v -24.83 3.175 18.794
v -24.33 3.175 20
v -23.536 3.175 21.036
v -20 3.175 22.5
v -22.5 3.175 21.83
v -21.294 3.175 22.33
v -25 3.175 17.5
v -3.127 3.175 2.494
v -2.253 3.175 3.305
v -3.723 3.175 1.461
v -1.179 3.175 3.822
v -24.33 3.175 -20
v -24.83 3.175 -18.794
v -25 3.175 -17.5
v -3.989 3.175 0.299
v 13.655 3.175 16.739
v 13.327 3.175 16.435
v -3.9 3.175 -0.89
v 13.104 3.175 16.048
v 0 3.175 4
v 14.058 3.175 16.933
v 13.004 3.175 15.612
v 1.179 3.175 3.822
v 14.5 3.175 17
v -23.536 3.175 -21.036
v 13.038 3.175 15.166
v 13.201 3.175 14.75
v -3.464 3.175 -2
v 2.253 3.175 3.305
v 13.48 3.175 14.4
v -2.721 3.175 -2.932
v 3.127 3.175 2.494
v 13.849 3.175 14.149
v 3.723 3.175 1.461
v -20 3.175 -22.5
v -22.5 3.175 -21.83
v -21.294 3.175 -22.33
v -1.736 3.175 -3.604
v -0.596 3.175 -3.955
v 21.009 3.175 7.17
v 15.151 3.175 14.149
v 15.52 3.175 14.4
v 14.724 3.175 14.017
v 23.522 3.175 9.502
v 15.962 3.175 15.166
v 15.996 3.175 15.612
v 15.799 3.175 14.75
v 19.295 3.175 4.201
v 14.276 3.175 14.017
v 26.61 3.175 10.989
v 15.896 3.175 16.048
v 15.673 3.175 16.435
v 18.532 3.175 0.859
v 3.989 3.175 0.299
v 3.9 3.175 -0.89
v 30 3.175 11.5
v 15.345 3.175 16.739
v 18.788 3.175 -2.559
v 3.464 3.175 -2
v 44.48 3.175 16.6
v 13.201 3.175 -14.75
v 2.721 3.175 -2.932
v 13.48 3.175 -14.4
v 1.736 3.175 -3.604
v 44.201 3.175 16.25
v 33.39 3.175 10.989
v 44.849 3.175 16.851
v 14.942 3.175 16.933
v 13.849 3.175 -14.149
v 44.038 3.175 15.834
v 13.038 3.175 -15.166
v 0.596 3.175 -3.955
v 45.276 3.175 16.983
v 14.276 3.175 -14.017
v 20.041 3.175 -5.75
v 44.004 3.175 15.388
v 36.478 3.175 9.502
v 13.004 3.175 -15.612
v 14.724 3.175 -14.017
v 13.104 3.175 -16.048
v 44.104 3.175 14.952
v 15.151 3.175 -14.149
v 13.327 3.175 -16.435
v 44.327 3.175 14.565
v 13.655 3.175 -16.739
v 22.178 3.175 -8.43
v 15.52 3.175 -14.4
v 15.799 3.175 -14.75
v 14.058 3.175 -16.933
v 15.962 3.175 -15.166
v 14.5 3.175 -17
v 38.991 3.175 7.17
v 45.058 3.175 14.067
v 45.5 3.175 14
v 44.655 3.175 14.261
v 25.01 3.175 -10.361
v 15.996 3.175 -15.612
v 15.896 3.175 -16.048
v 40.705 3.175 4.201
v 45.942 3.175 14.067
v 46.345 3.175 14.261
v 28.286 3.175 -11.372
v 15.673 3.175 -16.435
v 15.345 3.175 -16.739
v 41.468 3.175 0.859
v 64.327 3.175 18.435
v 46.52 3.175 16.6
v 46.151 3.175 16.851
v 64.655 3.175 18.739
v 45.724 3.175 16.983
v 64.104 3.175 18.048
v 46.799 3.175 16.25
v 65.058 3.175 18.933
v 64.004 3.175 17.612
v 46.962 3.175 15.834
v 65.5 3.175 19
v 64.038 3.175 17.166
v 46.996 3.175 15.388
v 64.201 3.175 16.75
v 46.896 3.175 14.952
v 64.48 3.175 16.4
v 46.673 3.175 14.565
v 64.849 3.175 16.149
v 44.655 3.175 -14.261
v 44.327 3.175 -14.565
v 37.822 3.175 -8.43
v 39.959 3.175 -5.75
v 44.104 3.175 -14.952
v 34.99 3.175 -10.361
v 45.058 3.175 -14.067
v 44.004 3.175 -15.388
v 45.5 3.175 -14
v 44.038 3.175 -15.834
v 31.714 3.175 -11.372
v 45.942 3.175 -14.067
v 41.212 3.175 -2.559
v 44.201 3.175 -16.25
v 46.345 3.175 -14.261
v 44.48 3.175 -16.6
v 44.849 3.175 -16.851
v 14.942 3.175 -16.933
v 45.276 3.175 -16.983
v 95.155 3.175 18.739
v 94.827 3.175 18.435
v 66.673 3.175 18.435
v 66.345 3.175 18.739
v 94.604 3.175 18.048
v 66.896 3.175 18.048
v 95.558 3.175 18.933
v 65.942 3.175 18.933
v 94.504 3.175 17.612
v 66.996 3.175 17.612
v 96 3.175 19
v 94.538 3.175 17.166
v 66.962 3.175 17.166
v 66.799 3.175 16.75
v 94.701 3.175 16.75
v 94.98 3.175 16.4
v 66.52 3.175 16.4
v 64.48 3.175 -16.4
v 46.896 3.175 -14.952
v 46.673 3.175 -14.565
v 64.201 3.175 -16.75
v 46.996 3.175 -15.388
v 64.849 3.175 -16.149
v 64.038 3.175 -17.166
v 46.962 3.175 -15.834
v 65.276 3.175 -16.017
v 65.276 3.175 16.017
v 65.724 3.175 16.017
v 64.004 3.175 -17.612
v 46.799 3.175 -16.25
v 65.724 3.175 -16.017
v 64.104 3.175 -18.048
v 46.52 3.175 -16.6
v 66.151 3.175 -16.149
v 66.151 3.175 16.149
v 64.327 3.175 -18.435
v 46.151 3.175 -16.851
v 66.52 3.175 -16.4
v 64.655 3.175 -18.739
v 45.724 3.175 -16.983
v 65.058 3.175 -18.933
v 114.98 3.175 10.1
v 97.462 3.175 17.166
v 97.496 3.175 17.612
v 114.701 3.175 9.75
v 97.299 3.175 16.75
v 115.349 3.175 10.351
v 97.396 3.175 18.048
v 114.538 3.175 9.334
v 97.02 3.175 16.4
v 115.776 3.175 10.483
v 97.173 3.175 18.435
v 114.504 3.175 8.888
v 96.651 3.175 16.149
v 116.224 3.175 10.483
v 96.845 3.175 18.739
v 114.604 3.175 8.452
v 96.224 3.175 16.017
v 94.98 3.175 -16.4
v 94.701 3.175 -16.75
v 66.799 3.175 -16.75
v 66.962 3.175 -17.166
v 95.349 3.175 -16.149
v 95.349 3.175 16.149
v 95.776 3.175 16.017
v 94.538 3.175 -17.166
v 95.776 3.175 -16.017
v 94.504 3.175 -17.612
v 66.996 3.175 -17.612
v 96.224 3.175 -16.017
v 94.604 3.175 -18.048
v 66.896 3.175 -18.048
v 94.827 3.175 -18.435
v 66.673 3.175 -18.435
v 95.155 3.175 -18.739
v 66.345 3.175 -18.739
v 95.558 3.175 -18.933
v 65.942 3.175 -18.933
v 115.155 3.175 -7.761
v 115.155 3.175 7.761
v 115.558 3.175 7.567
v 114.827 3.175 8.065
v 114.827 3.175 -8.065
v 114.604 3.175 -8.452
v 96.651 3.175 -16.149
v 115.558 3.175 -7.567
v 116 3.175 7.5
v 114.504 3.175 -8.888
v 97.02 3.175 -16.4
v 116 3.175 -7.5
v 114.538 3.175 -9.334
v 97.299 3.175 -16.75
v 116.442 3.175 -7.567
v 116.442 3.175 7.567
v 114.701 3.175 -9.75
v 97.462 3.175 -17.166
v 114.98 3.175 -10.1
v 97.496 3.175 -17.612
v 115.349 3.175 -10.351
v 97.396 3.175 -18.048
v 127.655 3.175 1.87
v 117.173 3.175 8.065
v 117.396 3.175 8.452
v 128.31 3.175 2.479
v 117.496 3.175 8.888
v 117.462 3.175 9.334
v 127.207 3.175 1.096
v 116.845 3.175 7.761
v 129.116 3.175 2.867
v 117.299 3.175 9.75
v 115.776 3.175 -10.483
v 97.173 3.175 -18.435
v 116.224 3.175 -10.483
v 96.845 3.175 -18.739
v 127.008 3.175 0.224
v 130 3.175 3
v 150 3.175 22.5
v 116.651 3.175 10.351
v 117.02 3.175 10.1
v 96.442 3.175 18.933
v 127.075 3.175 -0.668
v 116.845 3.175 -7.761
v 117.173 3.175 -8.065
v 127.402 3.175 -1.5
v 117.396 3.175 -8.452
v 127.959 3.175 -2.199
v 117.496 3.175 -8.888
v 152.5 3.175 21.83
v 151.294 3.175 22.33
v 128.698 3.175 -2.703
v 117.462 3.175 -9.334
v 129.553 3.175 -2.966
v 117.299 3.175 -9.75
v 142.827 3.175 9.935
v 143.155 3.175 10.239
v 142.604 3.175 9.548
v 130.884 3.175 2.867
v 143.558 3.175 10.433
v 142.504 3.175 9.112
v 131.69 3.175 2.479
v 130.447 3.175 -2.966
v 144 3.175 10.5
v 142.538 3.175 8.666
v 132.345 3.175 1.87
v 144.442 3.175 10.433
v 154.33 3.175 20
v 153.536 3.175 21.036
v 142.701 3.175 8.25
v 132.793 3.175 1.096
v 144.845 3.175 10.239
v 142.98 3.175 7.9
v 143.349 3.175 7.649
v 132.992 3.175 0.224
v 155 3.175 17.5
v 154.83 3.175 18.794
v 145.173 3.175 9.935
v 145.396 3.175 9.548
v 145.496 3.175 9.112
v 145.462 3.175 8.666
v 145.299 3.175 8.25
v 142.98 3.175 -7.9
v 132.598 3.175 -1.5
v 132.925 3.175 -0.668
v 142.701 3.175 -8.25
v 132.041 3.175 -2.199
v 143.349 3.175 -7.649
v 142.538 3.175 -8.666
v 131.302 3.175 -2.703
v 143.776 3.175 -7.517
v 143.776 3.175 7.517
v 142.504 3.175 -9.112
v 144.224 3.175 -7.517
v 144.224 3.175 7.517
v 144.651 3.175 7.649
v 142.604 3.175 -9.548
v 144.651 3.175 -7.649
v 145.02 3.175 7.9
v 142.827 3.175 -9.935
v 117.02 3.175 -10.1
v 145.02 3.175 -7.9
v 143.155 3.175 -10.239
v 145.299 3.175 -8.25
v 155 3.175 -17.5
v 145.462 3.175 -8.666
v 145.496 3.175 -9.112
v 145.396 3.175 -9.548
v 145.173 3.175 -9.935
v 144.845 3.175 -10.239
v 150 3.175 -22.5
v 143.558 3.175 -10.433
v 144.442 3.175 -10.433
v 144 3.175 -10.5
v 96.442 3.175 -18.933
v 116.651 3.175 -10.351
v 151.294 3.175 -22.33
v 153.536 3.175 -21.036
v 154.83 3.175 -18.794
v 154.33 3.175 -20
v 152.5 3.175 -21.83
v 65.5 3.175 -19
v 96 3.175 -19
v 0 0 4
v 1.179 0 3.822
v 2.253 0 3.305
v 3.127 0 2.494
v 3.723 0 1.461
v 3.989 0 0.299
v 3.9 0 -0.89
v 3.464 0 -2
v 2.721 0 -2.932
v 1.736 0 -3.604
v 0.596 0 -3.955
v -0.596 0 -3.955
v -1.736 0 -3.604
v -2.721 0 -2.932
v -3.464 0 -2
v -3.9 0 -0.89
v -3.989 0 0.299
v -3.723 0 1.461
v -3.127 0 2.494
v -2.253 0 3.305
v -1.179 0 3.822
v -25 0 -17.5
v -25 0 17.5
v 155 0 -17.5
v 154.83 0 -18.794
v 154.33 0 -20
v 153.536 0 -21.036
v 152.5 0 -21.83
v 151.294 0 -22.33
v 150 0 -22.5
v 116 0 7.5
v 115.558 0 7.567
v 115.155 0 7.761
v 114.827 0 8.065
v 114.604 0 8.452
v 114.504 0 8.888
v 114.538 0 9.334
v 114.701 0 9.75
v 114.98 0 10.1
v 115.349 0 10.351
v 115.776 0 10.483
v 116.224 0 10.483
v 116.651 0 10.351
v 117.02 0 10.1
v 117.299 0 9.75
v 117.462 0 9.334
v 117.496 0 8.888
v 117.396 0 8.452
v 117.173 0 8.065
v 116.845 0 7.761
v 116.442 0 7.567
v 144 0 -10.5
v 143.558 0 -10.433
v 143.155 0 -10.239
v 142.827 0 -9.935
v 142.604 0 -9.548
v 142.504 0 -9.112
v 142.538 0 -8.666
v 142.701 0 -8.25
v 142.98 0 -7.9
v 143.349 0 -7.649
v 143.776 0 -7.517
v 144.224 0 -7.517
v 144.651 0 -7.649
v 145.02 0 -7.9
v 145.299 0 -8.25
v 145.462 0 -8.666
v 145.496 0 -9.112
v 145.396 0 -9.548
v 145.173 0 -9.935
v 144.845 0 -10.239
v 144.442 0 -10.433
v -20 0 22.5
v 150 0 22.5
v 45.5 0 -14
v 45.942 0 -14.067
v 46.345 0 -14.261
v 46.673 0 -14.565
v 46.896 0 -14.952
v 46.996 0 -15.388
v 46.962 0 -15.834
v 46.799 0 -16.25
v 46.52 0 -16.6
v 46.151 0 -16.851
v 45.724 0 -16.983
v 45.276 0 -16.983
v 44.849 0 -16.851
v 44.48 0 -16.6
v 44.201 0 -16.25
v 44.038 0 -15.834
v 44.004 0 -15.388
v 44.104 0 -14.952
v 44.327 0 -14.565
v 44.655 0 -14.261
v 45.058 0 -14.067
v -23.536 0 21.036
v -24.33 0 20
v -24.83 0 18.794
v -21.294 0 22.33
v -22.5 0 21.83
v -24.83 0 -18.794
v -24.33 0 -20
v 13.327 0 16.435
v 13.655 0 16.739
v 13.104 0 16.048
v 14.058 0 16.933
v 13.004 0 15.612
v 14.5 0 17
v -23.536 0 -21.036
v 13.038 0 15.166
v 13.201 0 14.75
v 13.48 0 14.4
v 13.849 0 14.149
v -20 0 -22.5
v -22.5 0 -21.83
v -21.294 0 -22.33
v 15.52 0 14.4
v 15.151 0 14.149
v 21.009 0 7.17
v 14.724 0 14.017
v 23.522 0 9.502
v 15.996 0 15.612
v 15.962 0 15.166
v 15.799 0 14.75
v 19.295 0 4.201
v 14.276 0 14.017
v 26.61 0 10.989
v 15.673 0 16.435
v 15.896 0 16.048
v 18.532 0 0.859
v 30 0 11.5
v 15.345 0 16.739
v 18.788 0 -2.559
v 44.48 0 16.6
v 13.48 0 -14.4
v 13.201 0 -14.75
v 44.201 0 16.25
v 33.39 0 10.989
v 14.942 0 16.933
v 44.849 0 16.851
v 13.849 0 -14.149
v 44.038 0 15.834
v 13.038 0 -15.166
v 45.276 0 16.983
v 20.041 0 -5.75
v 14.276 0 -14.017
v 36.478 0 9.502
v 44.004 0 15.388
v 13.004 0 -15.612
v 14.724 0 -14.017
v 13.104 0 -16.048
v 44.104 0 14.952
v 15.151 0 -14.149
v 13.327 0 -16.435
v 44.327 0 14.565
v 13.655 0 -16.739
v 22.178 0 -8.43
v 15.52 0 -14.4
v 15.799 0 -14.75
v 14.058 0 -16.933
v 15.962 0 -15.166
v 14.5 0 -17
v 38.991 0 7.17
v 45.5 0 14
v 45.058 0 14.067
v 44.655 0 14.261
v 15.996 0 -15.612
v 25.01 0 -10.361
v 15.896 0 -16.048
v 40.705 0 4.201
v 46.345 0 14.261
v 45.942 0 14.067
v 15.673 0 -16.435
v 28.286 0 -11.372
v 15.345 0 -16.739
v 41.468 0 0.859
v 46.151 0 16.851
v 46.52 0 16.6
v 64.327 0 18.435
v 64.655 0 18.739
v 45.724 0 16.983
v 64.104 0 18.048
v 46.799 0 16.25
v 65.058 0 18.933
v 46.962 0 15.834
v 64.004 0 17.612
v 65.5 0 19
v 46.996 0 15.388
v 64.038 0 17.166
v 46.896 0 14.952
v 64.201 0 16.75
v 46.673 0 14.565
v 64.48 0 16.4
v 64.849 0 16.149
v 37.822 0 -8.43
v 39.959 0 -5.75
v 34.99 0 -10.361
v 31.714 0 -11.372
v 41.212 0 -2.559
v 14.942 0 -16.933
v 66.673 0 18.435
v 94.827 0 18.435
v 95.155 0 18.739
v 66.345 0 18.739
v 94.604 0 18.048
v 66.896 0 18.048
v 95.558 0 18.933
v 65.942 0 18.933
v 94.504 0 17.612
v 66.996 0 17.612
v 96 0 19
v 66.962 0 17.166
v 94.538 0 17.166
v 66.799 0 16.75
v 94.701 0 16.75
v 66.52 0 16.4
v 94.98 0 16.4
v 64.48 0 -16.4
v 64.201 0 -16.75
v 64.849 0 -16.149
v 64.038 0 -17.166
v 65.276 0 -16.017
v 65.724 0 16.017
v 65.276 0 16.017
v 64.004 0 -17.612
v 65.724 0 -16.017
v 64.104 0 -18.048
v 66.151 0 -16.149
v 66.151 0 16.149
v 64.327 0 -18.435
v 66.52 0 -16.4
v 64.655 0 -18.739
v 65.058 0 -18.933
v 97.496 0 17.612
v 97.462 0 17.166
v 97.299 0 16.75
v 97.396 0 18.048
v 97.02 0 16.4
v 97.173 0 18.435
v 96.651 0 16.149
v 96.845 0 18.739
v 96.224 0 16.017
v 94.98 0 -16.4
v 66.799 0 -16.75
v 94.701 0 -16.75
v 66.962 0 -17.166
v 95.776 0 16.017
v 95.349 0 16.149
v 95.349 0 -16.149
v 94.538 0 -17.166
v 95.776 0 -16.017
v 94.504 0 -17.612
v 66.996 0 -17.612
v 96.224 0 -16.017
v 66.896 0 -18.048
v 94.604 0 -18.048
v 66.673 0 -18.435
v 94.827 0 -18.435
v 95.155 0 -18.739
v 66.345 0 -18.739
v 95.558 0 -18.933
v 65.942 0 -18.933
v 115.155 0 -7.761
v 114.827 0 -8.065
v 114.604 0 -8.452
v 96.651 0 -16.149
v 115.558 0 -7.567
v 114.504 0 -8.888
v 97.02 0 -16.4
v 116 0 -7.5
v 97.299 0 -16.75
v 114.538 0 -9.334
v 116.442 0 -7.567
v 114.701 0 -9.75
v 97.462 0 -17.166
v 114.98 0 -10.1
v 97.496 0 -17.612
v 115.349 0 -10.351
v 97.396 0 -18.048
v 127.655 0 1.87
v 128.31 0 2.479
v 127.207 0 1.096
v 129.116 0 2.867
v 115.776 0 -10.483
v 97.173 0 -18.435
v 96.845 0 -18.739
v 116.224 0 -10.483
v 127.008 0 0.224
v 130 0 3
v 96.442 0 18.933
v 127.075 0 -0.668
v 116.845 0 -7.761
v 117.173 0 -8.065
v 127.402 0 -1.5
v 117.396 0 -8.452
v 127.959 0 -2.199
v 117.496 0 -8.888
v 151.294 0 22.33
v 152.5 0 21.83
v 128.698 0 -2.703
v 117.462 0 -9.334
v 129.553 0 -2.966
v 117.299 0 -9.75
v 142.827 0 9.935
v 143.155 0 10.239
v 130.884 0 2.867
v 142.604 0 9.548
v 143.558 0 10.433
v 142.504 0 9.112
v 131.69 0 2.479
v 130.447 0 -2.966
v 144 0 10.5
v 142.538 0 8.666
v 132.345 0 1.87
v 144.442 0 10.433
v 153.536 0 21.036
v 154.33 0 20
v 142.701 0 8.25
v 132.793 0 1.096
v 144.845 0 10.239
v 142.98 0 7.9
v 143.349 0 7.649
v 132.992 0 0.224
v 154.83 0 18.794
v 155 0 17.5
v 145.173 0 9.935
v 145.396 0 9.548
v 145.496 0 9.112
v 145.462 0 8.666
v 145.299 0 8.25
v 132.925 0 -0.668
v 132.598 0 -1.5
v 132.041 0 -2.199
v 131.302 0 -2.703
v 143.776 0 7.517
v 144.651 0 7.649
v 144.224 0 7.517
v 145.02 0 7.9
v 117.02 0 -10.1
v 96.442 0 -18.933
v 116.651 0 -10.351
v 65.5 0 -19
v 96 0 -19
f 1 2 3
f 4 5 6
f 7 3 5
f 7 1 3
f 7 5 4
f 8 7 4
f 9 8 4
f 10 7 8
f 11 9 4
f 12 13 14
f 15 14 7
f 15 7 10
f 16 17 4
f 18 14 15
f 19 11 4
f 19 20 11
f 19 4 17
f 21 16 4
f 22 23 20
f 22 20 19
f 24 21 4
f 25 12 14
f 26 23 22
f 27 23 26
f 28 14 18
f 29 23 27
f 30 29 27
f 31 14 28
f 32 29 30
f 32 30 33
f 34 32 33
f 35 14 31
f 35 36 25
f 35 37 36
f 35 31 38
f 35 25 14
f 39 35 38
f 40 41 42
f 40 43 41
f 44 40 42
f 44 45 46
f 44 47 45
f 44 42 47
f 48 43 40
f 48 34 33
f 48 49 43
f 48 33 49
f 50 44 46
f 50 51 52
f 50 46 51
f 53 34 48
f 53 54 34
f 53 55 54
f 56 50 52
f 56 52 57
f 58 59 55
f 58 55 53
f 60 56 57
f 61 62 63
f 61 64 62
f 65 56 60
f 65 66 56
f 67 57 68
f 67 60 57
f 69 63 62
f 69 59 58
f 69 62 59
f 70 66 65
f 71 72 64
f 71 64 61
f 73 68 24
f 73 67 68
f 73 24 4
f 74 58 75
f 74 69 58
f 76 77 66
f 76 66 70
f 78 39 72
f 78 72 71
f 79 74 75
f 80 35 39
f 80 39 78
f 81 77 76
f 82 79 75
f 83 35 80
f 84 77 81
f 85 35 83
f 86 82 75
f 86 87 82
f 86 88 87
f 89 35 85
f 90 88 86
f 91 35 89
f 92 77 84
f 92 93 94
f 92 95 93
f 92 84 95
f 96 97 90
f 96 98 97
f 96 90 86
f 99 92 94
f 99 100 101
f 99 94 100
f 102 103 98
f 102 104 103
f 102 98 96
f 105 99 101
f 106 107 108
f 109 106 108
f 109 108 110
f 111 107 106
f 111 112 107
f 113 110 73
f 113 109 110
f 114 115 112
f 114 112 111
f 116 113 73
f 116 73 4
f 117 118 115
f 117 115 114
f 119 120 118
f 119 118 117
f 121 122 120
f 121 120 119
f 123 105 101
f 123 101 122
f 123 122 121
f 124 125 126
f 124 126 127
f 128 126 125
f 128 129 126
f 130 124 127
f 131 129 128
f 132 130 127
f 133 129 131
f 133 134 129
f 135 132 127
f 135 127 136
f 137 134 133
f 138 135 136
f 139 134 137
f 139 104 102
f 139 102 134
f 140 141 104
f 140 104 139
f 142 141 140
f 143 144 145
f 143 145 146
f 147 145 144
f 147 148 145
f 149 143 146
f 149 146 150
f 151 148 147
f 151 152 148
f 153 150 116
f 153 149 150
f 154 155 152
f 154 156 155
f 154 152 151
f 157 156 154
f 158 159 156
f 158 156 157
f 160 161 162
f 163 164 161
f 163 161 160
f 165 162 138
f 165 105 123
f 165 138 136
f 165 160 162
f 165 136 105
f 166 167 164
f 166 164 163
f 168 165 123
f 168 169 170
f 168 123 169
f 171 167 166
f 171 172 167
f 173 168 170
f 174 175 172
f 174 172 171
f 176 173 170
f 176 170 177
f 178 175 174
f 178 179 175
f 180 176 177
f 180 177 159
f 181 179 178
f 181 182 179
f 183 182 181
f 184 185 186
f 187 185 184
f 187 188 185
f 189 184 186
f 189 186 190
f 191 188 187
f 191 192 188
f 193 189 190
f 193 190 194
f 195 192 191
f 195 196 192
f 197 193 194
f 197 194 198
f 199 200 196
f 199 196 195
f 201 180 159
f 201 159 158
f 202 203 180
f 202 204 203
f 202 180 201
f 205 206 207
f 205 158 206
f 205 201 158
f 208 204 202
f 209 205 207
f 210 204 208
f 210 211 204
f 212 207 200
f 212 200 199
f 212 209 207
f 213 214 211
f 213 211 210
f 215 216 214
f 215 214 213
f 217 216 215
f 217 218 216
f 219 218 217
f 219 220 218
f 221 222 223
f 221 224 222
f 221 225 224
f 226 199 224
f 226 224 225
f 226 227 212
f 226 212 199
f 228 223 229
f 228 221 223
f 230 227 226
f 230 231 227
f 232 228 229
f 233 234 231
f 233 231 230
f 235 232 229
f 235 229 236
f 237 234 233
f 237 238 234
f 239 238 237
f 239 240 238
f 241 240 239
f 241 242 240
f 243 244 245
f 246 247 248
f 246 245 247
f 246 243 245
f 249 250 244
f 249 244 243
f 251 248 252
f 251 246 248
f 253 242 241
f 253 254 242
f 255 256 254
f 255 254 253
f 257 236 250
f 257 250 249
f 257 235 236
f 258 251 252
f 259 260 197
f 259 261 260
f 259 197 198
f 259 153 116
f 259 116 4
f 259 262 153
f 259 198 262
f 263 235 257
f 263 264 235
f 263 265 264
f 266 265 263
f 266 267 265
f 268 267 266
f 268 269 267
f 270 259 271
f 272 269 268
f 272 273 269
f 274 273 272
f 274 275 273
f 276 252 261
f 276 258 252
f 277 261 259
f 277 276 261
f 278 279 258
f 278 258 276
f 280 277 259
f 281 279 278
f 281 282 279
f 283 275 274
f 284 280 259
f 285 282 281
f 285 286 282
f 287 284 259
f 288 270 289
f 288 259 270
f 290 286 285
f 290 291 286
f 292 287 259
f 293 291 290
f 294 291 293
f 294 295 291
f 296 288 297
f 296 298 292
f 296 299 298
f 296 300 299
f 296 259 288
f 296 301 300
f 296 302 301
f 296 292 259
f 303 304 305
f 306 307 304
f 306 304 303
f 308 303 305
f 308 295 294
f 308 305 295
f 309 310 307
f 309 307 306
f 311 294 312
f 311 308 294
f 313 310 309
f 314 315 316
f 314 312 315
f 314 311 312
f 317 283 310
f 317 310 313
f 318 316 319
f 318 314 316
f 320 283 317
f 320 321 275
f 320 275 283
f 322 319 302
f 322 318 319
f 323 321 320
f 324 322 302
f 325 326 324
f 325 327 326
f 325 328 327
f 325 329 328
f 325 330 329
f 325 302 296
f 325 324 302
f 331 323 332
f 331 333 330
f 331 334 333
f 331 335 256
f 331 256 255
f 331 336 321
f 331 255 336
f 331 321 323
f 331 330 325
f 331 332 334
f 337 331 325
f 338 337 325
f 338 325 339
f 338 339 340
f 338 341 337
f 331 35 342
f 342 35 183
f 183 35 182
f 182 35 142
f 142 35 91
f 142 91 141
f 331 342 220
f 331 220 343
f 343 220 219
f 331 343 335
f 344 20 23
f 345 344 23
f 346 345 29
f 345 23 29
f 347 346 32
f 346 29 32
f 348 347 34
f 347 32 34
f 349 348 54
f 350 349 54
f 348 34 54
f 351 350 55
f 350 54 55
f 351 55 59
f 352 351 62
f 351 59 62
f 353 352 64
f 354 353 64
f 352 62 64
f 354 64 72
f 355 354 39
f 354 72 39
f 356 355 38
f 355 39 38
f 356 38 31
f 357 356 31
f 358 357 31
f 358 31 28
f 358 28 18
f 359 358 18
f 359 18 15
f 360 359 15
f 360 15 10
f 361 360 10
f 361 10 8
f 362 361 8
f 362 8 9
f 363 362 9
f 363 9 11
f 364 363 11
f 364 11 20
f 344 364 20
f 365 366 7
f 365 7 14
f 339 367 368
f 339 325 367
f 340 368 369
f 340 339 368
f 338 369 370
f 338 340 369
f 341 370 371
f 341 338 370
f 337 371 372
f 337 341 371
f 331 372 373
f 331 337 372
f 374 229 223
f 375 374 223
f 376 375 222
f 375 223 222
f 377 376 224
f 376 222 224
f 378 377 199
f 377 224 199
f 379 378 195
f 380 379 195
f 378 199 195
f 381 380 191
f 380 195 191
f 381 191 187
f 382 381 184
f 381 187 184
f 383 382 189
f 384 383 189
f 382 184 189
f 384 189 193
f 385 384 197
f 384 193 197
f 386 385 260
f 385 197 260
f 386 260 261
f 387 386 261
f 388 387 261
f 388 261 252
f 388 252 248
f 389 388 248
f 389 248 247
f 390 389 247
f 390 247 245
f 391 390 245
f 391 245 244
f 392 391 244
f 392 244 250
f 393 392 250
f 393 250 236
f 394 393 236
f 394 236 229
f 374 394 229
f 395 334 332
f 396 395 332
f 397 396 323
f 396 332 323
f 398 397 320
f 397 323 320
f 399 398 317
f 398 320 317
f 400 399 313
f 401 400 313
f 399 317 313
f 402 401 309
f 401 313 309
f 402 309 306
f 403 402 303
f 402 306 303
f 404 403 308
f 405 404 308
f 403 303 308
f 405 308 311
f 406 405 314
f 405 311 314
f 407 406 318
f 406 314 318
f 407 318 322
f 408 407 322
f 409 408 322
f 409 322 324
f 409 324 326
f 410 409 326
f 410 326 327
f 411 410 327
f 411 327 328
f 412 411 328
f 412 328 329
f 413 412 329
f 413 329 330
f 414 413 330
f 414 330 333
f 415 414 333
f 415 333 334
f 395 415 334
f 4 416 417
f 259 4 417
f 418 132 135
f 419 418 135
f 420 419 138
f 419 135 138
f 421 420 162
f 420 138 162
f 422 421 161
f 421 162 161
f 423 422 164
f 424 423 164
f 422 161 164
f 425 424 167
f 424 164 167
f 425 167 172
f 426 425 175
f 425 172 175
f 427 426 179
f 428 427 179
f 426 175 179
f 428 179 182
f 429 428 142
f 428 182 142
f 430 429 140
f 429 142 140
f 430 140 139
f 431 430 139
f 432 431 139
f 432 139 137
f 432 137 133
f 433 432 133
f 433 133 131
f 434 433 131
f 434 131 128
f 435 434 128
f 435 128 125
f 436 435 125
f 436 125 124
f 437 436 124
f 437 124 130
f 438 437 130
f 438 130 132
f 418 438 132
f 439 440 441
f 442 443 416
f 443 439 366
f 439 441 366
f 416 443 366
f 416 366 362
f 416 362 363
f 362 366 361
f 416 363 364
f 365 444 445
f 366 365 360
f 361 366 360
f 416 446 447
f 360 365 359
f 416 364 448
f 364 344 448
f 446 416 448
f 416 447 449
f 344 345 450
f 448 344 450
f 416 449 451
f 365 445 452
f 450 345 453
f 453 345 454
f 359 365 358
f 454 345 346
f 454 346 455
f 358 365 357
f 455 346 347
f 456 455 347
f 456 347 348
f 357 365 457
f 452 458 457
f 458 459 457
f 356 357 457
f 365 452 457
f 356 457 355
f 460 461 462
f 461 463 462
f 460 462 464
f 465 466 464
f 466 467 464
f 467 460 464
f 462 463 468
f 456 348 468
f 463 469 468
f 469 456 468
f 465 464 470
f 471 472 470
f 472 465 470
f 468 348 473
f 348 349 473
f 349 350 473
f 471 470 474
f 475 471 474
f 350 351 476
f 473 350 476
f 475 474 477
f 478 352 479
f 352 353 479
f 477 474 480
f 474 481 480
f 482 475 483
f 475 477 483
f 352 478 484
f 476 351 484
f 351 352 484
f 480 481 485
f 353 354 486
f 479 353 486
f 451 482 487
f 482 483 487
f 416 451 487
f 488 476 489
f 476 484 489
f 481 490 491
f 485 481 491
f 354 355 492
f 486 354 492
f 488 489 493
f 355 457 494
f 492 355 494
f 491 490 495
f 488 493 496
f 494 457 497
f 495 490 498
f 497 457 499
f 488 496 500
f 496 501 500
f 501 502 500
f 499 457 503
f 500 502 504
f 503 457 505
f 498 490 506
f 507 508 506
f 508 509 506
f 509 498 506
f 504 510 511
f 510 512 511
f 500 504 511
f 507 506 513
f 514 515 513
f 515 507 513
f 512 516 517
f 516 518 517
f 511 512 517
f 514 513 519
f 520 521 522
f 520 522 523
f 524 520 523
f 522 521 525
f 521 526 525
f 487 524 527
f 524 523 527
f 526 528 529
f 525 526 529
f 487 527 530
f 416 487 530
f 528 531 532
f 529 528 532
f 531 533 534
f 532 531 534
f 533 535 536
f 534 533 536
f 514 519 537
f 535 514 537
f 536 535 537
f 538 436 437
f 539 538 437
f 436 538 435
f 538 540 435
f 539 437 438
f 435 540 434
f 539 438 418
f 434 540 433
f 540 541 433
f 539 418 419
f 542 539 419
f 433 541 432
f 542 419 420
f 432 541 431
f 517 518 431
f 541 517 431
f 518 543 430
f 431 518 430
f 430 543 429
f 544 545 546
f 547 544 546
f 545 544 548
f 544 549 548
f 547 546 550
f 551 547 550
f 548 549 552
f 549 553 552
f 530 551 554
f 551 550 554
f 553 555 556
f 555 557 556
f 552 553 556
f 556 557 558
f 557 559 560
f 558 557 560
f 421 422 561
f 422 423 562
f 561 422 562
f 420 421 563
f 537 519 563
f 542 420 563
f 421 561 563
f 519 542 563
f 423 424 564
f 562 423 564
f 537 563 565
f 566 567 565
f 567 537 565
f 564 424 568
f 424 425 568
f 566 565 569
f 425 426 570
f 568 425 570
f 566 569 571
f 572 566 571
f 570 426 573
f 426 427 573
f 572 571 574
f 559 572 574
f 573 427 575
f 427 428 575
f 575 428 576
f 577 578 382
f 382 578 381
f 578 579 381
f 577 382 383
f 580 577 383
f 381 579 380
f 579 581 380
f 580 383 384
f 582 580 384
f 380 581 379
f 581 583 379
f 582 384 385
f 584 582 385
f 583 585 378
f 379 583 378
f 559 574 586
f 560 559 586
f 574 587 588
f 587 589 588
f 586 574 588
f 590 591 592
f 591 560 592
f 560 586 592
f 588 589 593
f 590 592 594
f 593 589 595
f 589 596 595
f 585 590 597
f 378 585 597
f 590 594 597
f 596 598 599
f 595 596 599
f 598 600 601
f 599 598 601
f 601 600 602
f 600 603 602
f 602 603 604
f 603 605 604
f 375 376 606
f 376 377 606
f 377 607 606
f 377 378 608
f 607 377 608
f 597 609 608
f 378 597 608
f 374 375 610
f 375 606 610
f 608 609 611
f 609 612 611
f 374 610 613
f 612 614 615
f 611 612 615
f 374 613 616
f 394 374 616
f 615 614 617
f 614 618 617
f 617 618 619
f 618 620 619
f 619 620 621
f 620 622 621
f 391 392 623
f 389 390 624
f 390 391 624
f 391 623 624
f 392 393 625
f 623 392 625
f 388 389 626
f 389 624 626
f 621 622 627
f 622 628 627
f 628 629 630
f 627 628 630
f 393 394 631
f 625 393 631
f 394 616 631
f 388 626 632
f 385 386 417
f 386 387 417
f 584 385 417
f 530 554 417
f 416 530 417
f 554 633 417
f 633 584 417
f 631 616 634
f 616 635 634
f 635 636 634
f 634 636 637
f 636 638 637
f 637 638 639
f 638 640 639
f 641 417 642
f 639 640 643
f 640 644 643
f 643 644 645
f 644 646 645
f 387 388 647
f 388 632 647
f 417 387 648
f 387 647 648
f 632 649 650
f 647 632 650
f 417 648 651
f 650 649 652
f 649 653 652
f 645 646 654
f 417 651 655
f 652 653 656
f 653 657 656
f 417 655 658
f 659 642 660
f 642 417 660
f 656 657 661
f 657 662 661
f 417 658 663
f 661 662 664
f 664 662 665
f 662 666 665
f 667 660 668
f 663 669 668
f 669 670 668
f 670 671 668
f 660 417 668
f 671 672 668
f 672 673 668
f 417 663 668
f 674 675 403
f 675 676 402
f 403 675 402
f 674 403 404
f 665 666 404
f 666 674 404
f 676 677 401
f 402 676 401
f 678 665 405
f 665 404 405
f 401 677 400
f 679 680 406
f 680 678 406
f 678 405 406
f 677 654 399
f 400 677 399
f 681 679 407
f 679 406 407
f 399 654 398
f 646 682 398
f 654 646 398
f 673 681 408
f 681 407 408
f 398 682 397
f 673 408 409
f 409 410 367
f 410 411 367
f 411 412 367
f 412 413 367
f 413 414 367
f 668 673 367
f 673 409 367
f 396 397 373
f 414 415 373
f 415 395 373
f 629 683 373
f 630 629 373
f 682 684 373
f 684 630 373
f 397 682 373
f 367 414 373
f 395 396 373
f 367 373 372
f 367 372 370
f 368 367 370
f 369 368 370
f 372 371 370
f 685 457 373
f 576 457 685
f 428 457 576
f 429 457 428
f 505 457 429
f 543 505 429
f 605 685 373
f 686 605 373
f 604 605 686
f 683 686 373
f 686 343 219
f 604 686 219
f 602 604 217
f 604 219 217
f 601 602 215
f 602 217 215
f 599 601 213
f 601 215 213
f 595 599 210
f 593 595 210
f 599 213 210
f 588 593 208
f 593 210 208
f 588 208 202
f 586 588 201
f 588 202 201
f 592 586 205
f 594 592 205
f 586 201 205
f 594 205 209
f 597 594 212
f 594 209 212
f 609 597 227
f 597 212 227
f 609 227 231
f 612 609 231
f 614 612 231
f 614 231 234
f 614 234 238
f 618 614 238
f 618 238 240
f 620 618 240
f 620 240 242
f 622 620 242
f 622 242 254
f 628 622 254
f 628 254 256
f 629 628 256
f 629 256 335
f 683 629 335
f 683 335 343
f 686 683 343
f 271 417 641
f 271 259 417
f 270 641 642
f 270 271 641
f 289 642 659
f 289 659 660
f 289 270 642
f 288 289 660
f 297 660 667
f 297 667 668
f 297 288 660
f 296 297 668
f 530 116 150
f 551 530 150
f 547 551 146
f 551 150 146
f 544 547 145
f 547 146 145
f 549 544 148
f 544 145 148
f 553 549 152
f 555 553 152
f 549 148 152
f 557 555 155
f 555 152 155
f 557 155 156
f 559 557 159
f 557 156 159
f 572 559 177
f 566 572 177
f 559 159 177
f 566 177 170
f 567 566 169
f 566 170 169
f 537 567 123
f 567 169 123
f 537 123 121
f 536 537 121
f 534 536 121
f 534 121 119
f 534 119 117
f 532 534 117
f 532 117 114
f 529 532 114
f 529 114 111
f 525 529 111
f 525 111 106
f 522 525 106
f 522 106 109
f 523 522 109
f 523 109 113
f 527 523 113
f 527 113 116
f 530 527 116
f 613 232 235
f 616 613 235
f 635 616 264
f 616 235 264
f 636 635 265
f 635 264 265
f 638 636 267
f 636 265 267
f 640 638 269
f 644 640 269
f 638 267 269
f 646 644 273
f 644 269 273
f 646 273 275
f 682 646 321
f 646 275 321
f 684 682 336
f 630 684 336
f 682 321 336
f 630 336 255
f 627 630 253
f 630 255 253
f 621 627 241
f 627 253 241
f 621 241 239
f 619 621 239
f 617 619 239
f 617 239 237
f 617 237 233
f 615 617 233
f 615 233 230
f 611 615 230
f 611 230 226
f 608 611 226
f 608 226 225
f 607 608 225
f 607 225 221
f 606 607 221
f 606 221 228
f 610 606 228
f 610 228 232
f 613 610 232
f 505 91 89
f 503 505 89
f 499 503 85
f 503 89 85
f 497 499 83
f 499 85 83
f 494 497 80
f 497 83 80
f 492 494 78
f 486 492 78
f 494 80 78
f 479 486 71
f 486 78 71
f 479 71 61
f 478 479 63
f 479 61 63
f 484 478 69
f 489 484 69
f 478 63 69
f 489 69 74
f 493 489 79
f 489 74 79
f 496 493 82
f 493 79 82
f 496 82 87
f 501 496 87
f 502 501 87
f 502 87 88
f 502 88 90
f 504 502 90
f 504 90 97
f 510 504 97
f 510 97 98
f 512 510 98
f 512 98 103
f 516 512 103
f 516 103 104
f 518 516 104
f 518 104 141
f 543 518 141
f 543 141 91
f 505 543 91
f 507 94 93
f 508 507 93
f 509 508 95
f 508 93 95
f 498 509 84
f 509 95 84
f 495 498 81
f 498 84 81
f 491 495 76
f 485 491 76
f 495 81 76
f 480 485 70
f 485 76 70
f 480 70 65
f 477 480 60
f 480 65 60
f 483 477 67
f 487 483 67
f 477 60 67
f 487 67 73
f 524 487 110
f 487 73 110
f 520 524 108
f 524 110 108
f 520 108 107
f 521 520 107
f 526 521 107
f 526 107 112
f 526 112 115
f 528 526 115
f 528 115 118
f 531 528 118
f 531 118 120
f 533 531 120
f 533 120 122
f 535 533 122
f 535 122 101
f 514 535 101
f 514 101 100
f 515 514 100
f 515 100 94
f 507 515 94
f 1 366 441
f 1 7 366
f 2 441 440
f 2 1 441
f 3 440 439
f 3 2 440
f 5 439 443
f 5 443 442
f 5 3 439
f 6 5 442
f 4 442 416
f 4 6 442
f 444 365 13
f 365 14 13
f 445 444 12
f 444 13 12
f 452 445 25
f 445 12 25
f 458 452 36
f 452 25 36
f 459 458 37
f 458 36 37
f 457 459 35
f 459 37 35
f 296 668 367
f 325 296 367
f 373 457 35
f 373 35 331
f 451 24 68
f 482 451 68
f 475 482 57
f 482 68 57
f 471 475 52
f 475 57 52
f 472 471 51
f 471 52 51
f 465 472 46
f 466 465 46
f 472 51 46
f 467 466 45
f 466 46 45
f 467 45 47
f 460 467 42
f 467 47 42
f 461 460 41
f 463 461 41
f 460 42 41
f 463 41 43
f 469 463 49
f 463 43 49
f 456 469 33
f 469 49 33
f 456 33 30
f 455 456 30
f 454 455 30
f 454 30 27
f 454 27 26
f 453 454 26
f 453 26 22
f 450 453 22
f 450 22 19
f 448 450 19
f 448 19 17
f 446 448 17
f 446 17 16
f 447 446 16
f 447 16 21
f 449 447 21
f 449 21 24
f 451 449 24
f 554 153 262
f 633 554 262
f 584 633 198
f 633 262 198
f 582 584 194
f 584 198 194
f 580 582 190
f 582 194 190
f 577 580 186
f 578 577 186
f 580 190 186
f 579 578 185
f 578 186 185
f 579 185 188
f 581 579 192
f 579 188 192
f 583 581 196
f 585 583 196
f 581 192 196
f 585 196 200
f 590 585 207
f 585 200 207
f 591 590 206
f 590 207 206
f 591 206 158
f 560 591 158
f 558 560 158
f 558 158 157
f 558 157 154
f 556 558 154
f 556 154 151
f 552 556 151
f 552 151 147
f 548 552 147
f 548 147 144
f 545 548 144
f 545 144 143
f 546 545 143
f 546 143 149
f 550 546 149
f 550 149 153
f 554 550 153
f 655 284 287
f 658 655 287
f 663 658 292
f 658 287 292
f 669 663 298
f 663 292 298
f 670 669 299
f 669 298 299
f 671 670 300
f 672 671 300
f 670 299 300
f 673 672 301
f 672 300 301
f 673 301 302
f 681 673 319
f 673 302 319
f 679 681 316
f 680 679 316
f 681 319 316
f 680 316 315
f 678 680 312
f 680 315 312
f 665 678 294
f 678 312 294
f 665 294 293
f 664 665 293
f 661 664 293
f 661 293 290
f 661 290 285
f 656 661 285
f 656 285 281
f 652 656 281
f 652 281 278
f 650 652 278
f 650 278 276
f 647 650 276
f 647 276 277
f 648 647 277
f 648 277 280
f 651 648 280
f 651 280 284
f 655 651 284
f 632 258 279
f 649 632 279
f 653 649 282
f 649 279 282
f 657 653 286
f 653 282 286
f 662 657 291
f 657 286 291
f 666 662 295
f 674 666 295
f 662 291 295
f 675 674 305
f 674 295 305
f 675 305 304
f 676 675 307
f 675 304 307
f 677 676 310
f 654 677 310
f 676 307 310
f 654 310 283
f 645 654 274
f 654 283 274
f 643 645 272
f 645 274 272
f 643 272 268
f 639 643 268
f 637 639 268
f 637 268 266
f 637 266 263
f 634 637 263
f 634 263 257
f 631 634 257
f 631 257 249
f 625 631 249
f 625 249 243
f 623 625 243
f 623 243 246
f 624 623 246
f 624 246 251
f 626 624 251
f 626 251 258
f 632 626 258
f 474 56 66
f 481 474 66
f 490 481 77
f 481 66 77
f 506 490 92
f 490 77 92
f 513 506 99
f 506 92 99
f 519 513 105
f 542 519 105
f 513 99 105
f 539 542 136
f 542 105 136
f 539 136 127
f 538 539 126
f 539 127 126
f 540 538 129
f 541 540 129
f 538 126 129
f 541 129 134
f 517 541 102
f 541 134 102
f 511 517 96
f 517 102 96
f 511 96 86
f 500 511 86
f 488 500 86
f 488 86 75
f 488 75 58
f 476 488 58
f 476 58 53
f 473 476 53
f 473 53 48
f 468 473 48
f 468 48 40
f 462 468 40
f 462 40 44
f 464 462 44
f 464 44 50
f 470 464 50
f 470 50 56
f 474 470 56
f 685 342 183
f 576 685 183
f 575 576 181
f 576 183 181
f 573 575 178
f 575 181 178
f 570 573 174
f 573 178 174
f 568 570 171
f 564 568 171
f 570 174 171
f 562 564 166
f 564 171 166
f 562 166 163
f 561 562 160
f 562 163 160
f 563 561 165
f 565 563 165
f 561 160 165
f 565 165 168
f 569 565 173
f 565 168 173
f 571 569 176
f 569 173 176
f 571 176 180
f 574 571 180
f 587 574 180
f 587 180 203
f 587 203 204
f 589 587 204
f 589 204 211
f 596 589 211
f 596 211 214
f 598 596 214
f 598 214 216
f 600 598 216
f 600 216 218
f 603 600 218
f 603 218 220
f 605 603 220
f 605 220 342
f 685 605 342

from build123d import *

# Parameters (mm, degrees)
SKETCH1_W           = 180
SKETCH1_H           = 45
BOSS_EXTRUDE1_DEPTH = 3.175
FILLET1_R           = 5
SKETCH4_R           = 3
SKETCH4_R_2         = 1.5
CUT_EXTRUDE1_DEPTH  = 157.65672863
SKETCH5_R           = 4
CUT_EXTRUDE2_DEPTH  = 157.65672863
SKETCH6_R           = 1.5
SKETCH6_R_2         = 11.5
CUT_EXTRUDE3_DEPTH  = 157.65672863
SKETCH10_R          = 1.5
CUT_EXTRUDE4_DEPTH  = 157.65672863


with BuildPart() as part:
    # Sketch1 → Boss-Extrude1 (new body)
    with BuildSketch(Plane(origin=(0, 0, 0), x_dir=(1, 0, 0), z_dir=(0, 1, 0))):
        with Locations((65, 0)):
            Rectangle(SKETCH1_W, SKETCH1_H)
    extrude(amount=BOSS_EXTRUDE1_DEPTH)

    # Fillet1
    fillet1_edges = [part.edges().sort_by_distance(p)[0] for p in [
        (-25, 1.5875, -22.5),
        (155, 1.5875, -22.5),
        (155, 1.5875, 22.5),
        (-25, 1.5875, 22.5),
    ]]
    fillet(fillet1_edges, radius=FILLET1_R)

    # Sketch4 → Cut-Extrude1 (cut, through all)
    with BuildSketch(Plane(origin=(0, 3.175, 0), x_dir=(1, 0, 0), z_dir=(0, 1, 0))):
        with Locations(Location((130, 0, 0), (0, 0, 270))):
            Circle(SKETCH4_R)
        with Locations(Location((116, 9, 0), (0, 0, 270))):
            Circle(SKETCH4_R_2)
        with Locations(Location((144, 9, 0), (0, 0, 90))):
            Circle(SKETCH4_R_2)
        with Locations(Location((144, -9, 0), (0, 0, 270))):
            Circle(SKETCH4_R_2)
        with Locations(Location((116, -9, 0), (0, 0, 90))):
            Circle(SKETCH4_R_2)
    extrude(amount=-CUT_EXTRUDE1_DEPTH, mode=Mode.SUBTRACT)

    # Sketch5 → Cut-Extrude2 (cut, through all)
    with BuildSketch(Plane(origin=(0, 3.175, 0), x_dir=(1, 0, 0), z_dir=(0, 1, 0))):
        with Locations(Location((0, 0, 0), (0, 0, 270))):
            Circle(SKETCH5_R)
    extrude(amount=-CUT_EXTRUDE2_DEPTH, mode=Mode.SUBTRACT)

    # Sketch6 → Cut-Extrude3 (cut, through all)
    with BuildSketch(Plane(origin=(0, 3.175, 0), x_dir=(1, 0, 0), z_dir=(0, 1, 0))):
        with Locations(Location((14.5, -15.5, 0), (0, 0, 270))):
            Circle(SKETCH6_R)
        with Locations(Location((14.5, 15.5, 0), (0, 0, 90))):
            Circle(SKETCH6_R)
        with Locations(Location((45.5, 15.5, 0), (0, 0, 270))):
            Circle(SKETCH6_R)
        with Locations(Location((45.5, -15.5, 0), (0, 0, 90))):
            Circle(SKETCH6_R)
        with Locations(Location((30, 0, 0), (0, 0, 270))):
            Circle(SKETCH6_R_2)
    extrude(amount=-CUT_EXTRUDE3_DEPTH, mode=Mode.SUBTRACT)

    # Sketch10 → Cut-Extrude4 (cut, through all)
    with BuildSketch(Plane(origin=(0, 3.175, 0), x_dir=(1, 0, 0), z_dir=(0, 1, 0))):
        with Locations(Location((65.5, -17.5, 0), (0, 0, 270))):
            Circle(SKETCH10_R)
        with Locations(Location((96, -17.5, 0), (0, 0, 270))):
            Circle(SKETCH10_R)
        with Locations(Location((96, 17.5, 0), (0, 0, 90))):
            Circle(SKETCH10_R)
        with Locations(Location((65.5, 17.5, 0), (0, 0, 90))):
            Circle(SKETCH10_R)
    extrude(amount=-CUT_EXTRUDE4_DEPTH, mode=Mode.SUBTRACT)


solid = part.part
